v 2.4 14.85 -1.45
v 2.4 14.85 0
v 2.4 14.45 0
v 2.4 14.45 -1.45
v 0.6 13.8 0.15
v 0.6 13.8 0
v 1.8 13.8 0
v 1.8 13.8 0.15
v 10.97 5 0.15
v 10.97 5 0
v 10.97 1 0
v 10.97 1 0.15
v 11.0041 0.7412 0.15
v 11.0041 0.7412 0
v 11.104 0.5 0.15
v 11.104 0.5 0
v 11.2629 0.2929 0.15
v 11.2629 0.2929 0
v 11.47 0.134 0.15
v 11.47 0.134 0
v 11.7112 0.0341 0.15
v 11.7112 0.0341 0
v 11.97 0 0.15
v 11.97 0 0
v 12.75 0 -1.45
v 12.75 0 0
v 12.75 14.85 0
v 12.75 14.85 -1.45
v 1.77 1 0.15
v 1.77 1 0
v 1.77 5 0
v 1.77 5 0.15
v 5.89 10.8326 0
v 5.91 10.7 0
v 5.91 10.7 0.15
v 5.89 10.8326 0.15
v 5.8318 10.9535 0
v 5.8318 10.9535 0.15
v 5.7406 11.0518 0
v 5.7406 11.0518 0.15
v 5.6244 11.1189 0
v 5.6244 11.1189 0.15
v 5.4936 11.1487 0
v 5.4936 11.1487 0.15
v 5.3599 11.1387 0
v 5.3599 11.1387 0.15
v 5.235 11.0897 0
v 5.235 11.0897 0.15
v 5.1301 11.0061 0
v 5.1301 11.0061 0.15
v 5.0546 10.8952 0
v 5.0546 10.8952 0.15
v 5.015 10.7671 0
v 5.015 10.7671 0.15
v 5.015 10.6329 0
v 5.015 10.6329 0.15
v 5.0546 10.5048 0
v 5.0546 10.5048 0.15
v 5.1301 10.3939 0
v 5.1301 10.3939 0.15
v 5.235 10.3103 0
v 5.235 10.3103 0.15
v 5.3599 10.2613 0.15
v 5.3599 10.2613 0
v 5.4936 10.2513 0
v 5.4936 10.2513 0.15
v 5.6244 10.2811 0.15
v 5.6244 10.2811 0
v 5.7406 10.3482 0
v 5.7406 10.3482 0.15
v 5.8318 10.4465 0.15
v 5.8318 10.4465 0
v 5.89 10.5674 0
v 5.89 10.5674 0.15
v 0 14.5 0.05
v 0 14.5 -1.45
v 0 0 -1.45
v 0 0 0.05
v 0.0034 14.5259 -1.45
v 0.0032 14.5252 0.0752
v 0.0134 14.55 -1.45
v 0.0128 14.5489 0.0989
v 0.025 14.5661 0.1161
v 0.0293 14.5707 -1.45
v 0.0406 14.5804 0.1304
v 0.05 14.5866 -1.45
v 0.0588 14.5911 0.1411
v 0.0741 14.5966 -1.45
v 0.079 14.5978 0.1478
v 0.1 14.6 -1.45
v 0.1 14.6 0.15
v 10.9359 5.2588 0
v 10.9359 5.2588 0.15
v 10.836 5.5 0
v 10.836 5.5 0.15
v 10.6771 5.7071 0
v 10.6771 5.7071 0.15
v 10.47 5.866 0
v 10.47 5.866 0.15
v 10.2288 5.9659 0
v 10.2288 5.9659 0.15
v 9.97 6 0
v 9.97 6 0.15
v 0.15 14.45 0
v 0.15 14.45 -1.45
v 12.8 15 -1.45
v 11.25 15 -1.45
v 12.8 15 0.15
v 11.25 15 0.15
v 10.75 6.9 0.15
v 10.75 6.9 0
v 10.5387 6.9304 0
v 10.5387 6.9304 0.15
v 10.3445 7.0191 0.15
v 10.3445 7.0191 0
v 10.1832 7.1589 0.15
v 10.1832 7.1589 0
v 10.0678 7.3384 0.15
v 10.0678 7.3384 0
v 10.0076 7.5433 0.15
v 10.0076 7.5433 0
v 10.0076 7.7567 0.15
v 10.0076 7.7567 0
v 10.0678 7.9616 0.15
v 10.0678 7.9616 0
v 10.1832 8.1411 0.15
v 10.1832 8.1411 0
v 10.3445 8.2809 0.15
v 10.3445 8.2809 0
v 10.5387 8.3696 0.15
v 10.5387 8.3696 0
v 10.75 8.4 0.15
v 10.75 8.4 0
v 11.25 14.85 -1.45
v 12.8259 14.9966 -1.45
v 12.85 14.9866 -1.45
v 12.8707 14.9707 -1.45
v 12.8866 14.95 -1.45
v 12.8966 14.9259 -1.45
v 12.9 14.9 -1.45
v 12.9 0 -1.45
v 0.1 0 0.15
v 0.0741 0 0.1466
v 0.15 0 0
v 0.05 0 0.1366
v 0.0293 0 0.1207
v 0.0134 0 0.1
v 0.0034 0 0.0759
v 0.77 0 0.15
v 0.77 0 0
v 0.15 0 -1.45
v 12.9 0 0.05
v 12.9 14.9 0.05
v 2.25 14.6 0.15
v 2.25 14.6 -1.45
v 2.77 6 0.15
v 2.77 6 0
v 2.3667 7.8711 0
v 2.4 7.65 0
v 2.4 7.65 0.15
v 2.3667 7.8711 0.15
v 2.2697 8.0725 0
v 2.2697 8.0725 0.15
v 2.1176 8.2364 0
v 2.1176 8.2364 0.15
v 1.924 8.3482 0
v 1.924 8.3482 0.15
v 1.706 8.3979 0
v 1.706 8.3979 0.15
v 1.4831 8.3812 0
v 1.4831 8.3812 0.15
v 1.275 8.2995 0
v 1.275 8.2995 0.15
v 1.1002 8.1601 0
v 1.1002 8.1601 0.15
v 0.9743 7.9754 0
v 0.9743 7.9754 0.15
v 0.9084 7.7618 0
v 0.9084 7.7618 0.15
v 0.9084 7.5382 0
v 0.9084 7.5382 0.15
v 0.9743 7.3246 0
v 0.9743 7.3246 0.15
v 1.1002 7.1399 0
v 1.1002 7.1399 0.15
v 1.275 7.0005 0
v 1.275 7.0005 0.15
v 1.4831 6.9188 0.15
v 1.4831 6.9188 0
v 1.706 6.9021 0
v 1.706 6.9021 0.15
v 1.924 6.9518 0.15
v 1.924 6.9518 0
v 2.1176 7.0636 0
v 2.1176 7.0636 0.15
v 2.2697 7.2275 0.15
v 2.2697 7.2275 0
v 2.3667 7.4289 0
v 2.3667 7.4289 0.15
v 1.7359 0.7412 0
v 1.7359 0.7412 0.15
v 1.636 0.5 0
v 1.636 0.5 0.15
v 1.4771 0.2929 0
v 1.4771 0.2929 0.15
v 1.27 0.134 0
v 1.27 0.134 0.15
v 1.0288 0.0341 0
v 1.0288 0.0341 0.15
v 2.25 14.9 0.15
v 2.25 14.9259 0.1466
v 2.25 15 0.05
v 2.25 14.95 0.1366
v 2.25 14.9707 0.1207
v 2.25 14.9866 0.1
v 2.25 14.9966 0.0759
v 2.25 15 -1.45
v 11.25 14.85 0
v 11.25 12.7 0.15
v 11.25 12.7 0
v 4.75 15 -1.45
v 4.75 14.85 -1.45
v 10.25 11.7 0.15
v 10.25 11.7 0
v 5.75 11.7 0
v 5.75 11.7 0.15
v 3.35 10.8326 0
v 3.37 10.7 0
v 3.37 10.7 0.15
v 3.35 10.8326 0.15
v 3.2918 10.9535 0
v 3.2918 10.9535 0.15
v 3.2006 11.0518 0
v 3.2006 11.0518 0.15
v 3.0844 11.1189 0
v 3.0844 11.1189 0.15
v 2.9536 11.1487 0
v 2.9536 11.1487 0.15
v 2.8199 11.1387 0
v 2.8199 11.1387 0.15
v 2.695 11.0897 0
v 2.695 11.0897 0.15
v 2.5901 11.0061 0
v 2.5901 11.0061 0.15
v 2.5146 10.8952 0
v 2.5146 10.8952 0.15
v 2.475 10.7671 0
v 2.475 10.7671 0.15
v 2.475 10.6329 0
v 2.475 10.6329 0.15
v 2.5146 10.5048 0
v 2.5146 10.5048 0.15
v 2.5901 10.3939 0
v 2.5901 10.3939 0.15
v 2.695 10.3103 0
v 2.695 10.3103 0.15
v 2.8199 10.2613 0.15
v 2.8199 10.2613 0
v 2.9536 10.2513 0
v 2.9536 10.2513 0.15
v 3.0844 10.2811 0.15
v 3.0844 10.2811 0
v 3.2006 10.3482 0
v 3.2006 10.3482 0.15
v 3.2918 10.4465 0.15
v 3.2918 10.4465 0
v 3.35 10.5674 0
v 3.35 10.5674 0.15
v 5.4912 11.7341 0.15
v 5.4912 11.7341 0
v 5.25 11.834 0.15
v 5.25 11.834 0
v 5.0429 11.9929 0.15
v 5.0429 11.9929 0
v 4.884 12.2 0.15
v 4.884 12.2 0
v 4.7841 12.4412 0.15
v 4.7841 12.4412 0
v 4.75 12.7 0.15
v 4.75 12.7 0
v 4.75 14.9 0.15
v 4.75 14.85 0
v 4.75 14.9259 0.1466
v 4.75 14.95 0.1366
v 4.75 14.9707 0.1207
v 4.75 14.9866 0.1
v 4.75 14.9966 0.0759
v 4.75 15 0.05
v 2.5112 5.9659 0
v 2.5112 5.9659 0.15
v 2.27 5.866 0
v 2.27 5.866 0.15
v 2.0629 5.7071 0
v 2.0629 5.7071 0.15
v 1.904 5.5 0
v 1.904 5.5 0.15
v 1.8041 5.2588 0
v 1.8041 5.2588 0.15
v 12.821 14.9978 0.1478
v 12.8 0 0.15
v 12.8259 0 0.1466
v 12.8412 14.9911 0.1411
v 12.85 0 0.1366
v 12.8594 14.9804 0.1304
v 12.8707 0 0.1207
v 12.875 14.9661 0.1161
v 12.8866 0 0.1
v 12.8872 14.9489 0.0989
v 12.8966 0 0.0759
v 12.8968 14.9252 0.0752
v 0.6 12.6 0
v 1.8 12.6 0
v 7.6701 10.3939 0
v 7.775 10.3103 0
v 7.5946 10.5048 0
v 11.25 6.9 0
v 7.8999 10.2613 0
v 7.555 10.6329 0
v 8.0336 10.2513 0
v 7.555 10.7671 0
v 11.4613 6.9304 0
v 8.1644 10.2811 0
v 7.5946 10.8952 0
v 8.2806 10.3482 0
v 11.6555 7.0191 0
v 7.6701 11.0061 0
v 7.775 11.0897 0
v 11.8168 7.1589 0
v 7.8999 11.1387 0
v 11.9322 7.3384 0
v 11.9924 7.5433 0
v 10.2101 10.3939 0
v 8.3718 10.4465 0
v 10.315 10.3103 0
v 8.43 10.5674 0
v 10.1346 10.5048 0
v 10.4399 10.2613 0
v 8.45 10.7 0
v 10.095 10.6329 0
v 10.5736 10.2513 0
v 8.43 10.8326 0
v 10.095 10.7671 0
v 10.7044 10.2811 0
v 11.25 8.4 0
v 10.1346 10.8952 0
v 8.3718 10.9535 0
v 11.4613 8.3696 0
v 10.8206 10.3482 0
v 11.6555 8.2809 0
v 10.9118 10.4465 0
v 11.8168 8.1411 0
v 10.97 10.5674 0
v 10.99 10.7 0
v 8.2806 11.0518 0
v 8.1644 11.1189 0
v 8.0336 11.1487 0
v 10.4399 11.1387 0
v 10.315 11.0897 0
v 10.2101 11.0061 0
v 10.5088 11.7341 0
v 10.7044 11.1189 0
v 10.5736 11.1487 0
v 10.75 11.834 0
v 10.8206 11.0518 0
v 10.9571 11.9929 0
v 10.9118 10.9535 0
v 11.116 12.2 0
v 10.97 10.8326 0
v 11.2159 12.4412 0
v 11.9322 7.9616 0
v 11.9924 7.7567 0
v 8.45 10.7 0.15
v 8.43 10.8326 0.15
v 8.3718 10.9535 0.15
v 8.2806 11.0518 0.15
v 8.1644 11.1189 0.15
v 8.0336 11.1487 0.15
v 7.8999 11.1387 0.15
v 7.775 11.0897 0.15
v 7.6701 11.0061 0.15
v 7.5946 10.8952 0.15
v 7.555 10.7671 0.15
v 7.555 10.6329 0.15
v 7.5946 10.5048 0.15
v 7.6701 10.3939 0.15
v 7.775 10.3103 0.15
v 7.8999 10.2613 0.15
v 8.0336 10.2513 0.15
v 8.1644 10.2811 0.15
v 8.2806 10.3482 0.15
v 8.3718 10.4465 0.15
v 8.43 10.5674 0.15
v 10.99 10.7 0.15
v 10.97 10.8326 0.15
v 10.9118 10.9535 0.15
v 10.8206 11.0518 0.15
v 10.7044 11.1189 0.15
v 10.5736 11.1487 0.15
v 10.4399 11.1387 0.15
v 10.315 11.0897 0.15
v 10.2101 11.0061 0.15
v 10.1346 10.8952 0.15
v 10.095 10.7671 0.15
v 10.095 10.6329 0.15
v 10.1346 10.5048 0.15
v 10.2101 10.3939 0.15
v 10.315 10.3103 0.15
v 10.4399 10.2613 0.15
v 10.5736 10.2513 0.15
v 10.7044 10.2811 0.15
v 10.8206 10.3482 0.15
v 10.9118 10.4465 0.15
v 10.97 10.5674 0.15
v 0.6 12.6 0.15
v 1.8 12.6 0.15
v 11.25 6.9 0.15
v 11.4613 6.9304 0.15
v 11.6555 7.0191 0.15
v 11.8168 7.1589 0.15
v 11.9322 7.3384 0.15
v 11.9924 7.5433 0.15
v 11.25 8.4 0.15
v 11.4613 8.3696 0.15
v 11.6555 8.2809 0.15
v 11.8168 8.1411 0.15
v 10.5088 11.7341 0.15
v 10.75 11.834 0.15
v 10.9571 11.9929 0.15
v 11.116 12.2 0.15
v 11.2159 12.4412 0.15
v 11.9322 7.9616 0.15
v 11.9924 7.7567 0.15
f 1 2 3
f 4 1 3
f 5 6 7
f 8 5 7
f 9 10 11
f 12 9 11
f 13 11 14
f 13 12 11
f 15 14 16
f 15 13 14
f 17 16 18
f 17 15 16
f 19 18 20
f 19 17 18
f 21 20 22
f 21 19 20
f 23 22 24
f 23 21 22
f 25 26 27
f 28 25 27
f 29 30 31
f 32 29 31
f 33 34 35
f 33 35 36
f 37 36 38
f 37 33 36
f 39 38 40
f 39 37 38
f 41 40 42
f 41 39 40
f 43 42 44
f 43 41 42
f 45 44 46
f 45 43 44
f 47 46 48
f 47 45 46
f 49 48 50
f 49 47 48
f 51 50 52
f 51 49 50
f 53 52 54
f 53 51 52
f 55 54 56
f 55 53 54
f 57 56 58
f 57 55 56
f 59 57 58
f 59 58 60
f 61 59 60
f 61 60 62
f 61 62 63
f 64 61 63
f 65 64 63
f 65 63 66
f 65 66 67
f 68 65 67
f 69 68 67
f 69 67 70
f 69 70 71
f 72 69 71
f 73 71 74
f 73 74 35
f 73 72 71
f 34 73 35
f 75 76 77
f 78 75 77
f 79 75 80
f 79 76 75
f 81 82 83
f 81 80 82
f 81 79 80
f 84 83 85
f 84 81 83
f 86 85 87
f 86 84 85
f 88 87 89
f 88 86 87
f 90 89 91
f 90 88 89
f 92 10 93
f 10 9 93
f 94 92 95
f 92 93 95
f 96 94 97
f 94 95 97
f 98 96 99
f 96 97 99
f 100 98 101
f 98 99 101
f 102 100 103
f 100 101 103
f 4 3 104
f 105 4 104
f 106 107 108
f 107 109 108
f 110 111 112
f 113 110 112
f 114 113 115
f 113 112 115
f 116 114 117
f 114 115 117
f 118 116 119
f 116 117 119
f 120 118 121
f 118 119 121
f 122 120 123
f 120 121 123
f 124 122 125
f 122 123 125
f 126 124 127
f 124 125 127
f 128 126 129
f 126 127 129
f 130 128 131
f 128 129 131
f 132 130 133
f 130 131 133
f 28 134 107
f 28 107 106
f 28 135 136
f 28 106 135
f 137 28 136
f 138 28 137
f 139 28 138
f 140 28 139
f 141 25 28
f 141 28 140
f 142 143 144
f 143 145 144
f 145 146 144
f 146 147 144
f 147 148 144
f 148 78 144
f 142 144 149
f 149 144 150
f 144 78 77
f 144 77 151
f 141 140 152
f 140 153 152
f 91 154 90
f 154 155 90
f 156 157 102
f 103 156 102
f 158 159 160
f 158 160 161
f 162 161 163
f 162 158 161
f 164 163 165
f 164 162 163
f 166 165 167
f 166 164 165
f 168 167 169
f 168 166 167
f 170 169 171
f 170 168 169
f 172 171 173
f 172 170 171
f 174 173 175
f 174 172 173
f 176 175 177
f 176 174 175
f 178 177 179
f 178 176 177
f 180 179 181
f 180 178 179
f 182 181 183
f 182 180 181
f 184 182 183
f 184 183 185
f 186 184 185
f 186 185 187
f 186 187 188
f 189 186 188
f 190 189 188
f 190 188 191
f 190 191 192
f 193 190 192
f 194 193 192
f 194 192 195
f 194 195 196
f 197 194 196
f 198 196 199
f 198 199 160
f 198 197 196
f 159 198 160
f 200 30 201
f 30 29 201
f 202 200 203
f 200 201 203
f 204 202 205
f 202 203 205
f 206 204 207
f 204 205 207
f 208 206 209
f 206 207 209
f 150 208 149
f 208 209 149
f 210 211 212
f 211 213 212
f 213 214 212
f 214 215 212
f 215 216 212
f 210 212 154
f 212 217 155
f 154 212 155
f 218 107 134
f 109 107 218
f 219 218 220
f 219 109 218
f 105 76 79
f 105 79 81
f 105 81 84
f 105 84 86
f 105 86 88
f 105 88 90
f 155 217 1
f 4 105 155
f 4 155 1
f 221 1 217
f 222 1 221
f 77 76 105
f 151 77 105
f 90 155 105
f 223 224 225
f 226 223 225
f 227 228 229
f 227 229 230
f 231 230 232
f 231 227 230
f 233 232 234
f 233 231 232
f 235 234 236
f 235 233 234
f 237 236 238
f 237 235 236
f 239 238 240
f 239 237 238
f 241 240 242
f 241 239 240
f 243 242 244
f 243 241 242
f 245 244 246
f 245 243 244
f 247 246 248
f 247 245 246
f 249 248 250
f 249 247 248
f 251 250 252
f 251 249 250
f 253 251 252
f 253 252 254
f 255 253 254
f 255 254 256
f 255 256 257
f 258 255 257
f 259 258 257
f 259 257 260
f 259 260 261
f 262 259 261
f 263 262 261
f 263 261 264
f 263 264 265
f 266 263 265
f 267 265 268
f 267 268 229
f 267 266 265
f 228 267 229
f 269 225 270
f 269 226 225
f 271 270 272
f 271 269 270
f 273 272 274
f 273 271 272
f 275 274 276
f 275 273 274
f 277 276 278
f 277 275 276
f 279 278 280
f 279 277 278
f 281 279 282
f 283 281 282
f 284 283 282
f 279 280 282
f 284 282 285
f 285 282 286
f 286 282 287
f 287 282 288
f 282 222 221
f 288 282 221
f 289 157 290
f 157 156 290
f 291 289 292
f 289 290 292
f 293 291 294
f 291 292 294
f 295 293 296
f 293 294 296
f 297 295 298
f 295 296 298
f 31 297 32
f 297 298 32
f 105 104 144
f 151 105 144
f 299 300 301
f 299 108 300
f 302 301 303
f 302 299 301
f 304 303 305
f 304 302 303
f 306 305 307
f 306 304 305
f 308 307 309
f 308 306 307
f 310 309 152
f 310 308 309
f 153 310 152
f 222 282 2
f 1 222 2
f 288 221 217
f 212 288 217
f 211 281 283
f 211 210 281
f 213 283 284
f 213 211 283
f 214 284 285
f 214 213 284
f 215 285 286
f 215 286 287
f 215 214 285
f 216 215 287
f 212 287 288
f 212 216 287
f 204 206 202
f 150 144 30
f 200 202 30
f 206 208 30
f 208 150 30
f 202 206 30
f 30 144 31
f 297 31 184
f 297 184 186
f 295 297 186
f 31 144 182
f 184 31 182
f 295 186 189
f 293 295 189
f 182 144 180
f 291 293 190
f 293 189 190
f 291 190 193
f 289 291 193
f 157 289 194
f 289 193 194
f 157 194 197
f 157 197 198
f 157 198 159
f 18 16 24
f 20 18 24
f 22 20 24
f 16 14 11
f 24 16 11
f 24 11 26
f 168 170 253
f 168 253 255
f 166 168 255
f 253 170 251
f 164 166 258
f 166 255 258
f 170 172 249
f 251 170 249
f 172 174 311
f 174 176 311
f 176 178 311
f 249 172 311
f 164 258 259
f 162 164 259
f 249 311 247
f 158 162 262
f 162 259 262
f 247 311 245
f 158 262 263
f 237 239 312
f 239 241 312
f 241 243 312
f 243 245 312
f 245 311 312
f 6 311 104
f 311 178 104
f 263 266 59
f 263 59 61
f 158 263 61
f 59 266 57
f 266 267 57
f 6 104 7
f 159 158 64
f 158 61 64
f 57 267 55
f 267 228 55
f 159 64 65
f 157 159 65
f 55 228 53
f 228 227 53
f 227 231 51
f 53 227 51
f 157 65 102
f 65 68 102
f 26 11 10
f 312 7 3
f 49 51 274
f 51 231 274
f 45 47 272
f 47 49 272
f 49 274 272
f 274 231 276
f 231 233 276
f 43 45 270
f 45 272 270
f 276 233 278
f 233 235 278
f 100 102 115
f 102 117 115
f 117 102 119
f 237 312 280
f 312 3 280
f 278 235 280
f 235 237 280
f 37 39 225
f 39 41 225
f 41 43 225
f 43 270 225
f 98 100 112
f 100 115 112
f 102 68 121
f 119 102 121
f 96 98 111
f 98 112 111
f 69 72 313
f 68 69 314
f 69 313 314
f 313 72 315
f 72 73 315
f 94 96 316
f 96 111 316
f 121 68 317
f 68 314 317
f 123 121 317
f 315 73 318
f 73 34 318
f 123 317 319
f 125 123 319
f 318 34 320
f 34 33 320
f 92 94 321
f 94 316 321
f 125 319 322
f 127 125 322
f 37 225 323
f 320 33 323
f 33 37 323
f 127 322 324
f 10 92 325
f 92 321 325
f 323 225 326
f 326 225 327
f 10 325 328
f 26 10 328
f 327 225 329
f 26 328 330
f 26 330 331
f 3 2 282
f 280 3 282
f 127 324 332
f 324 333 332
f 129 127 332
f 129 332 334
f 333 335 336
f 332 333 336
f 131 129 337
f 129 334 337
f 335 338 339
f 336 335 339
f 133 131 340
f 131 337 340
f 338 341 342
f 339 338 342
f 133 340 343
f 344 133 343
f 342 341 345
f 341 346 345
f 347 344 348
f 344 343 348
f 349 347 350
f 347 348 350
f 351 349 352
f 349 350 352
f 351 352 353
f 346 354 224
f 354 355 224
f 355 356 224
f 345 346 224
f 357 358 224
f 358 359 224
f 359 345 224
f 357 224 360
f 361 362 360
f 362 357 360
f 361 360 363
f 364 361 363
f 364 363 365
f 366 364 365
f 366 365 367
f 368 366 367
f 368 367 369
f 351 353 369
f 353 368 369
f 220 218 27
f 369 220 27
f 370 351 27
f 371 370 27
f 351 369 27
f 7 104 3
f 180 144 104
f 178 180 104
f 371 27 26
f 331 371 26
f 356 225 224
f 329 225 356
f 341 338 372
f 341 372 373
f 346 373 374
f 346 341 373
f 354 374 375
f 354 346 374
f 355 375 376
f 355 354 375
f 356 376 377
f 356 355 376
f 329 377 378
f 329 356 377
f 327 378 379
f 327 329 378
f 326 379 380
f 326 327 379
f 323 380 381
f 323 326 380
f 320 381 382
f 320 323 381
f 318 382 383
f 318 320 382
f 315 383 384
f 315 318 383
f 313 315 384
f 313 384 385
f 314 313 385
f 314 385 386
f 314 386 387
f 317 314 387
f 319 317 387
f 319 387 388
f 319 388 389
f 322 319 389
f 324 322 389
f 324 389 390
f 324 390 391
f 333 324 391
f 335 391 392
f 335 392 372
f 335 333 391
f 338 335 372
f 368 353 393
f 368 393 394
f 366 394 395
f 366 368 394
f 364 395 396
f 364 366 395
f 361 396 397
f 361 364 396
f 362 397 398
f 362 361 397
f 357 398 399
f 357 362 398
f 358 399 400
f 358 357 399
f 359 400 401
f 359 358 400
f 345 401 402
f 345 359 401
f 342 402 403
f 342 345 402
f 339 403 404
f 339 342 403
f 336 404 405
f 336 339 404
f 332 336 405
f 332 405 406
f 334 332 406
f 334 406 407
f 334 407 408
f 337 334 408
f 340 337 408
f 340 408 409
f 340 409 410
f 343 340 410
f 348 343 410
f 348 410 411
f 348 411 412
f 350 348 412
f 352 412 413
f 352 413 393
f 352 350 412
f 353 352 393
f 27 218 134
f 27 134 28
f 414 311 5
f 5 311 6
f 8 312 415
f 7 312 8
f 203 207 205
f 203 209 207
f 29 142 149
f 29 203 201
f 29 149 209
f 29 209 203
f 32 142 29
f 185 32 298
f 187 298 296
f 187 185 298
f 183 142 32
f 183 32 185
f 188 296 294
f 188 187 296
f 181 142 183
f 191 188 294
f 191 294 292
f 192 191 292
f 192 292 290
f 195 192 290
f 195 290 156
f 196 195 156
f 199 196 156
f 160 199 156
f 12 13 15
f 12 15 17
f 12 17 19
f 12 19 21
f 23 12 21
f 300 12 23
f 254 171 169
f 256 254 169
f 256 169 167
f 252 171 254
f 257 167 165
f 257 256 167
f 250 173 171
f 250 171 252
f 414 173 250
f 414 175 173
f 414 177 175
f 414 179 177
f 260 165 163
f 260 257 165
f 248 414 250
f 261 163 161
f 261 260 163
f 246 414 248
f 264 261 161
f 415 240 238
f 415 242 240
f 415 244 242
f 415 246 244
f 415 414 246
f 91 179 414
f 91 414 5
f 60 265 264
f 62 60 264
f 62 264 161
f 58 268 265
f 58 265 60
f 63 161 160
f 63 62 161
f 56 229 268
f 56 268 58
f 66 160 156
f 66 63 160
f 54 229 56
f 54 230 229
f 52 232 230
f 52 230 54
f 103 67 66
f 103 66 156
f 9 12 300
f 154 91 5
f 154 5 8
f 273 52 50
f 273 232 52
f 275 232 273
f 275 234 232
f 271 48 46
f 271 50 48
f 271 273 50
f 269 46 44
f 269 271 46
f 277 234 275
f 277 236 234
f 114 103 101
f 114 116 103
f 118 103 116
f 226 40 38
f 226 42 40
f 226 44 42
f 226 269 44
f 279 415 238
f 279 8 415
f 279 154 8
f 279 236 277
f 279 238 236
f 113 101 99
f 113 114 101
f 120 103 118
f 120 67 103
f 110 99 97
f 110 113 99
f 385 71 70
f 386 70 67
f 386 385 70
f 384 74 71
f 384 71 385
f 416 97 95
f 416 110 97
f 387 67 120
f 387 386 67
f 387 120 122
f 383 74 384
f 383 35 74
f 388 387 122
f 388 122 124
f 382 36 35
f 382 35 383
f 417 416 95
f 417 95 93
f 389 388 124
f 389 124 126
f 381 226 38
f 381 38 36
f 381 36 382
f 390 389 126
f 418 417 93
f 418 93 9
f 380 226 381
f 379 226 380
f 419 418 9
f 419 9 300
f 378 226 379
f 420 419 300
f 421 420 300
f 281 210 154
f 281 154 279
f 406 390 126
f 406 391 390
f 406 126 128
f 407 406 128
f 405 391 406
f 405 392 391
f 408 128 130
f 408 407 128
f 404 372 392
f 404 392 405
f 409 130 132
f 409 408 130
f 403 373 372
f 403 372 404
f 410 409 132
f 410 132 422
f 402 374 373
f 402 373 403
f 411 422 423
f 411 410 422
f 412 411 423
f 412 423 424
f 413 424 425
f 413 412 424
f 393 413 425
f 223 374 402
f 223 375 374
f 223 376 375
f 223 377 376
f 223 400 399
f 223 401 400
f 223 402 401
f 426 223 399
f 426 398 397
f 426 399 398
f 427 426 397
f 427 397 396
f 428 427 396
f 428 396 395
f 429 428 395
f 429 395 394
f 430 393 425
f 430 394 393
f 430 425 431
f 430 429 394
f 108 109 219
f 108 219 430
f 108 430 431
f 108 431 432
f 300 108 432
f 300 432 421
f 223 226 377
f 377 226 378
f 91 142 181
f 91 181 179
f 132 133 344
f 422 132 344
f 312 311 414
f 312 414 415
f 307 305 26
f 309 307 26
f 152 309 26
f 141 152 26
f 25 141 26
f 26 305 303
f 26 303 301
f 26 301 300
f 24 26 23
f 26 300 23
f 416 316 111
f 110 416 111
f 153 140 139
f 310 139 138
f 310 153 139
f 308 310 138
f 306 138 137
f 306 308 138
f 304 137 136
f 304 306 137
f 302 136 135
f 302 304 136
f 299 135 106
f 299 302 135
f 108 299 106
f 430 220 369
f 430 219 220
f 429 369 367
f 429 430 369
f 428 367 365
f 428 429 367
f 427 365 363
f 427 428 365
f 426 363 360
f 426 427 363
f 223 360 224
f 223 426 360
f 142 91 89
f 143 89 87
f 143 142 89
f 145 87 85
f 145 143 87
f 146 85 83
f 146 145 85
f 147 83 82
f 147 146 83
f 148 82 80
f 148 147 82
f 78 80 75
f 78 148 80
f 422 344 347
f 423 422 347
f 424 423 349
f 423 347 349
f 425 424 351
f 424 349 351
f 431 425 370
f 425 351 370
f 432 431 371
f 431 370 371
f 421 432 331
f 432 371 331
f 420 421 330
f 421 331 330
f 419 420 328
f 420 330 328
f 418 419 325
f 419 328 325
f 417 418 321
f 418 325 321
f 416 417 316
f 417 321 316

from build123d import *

# Parameters (mm, degrees)
F0_R     = 0.75
F0_R_2   = 0.45
F0_W     = 1.2
F0_H     = 1.2
F1_DEPTH = 0.15
F2_W     = 1.5
F2_H     = 0.15
F2_W_2   = 0.15
F2_H_2   = 14.45
F3_DEPTH = 1.45
F4_R     = 1
F5_R     = 0.1


with BuildPart() as f1:
    # F0 (on Top) → F1 (new body)
    with BuildSketch(Plane.XY):
        Polygon((0, 14.6), (0, 0), (1.77, 0), (1.77, 6), (10.97, 6), (10.97, 0), (12.9, 0), (12.9, 15), (11.25, 15), (11.25, 11.7), (4.75, 11.7), (4.75, 15), (2.25, 15), (2.25, 14.6), align=None)
        with Locations((1.65, 7.65)):
            Circle(F0_R, mode=Mode.SUBTRACT)
        with Locations((2.92, 10.7)):
            Circle(F0_R_2, mode=Mode.SUBTRACT)
        with Locations((5.46, 10.7)):
            Circle(F0_R_2, mode=Mode.SUBTRACT)
        with Locations((1.2, 13.2)):
            Rectangle(F0_W, F0_H, mode=Mode.SUBTRACT)
        with Locations((8, 10.7)):
            Circle(F0_R_2, mode=Mode.SUBTRACT)
        with BuildLine():
            ThreePointArc((11.25, 8.4), (12, 7.65), (11.25, 6.9))
            Line((11.25, 6.9), (10.75, 6.9))
            ThreePointArc((10.75, 6.9), (10, 7.65), (10.75, 8.4))
            Line((10.75, 8.4), (11.25, 8.4))
        make_face(mode=Mode.SUBTRACT)
        with Locations((10.54, 10.7)):
            Circle(F0_R_2, mode=Mode.SUBTRACT)
    extrude(amount=F1_DEPTH)

    # F2 (on face) → F3 (join)
    with BuildSketch(Plane(origin=(0, 0, 0), x_dir=(1, 0, 0), z_dir=(0, 0, -1))):
        Polygon((12.9, -15), (12.9, 0), (12.75, 0), (12.75, -14.85), (12.75, -15), align=None)
        with Locations((12, -14.925)):
            Rectangle(F2_W, F2_H)
        Polygon((4.75, -15), (4.75, -14.85), (2.4, -14.85), (2.25, -14.85), (2.25, -15), align=None)
        Polygon((2.25, -14.85), (2.4, -14.85), (2.4, -14.45), (2.25, -14.45), (2.25, -14.6), align=None)
        Polygon((2.25, -14.45), (0.15, -14.45), (0, -14.45), (0, -14.6), (2.25, -14.6), align=None)
        with Locations((0.075, -7.225)):
            Rectangle(F2_W_2, F2_H_2)
    extrude(amount=F3_DEPTH)

    # F4
    f4_edges = [f1.edges().sort_by_distance(p)[0] for p in [
        (1.77, 6, 0.075),
        (1.77, 0, 0.075),
        (10.97, 6, 0.075),
        (10.97, 0, 0.075),
        (4.75, 11.7, 0.075),
        (11.25, 11.7, 0.075),
    ]]
    fillet(f4_edges, radius=F4_R)

    # F5
    f5_edges = [f1.edges().sort_by_distance(p)[0] for p in [
        (12.9, 7.5, 0.15),
        (0, 7.3, 0.15),
        (3.5, 15, 0.15),
        (0, 14.6, -0.65),
        (12.9, 15, -0.65),
    ]]
    fillet(f5_edges, radius=F5_R)


solid = f1.part
